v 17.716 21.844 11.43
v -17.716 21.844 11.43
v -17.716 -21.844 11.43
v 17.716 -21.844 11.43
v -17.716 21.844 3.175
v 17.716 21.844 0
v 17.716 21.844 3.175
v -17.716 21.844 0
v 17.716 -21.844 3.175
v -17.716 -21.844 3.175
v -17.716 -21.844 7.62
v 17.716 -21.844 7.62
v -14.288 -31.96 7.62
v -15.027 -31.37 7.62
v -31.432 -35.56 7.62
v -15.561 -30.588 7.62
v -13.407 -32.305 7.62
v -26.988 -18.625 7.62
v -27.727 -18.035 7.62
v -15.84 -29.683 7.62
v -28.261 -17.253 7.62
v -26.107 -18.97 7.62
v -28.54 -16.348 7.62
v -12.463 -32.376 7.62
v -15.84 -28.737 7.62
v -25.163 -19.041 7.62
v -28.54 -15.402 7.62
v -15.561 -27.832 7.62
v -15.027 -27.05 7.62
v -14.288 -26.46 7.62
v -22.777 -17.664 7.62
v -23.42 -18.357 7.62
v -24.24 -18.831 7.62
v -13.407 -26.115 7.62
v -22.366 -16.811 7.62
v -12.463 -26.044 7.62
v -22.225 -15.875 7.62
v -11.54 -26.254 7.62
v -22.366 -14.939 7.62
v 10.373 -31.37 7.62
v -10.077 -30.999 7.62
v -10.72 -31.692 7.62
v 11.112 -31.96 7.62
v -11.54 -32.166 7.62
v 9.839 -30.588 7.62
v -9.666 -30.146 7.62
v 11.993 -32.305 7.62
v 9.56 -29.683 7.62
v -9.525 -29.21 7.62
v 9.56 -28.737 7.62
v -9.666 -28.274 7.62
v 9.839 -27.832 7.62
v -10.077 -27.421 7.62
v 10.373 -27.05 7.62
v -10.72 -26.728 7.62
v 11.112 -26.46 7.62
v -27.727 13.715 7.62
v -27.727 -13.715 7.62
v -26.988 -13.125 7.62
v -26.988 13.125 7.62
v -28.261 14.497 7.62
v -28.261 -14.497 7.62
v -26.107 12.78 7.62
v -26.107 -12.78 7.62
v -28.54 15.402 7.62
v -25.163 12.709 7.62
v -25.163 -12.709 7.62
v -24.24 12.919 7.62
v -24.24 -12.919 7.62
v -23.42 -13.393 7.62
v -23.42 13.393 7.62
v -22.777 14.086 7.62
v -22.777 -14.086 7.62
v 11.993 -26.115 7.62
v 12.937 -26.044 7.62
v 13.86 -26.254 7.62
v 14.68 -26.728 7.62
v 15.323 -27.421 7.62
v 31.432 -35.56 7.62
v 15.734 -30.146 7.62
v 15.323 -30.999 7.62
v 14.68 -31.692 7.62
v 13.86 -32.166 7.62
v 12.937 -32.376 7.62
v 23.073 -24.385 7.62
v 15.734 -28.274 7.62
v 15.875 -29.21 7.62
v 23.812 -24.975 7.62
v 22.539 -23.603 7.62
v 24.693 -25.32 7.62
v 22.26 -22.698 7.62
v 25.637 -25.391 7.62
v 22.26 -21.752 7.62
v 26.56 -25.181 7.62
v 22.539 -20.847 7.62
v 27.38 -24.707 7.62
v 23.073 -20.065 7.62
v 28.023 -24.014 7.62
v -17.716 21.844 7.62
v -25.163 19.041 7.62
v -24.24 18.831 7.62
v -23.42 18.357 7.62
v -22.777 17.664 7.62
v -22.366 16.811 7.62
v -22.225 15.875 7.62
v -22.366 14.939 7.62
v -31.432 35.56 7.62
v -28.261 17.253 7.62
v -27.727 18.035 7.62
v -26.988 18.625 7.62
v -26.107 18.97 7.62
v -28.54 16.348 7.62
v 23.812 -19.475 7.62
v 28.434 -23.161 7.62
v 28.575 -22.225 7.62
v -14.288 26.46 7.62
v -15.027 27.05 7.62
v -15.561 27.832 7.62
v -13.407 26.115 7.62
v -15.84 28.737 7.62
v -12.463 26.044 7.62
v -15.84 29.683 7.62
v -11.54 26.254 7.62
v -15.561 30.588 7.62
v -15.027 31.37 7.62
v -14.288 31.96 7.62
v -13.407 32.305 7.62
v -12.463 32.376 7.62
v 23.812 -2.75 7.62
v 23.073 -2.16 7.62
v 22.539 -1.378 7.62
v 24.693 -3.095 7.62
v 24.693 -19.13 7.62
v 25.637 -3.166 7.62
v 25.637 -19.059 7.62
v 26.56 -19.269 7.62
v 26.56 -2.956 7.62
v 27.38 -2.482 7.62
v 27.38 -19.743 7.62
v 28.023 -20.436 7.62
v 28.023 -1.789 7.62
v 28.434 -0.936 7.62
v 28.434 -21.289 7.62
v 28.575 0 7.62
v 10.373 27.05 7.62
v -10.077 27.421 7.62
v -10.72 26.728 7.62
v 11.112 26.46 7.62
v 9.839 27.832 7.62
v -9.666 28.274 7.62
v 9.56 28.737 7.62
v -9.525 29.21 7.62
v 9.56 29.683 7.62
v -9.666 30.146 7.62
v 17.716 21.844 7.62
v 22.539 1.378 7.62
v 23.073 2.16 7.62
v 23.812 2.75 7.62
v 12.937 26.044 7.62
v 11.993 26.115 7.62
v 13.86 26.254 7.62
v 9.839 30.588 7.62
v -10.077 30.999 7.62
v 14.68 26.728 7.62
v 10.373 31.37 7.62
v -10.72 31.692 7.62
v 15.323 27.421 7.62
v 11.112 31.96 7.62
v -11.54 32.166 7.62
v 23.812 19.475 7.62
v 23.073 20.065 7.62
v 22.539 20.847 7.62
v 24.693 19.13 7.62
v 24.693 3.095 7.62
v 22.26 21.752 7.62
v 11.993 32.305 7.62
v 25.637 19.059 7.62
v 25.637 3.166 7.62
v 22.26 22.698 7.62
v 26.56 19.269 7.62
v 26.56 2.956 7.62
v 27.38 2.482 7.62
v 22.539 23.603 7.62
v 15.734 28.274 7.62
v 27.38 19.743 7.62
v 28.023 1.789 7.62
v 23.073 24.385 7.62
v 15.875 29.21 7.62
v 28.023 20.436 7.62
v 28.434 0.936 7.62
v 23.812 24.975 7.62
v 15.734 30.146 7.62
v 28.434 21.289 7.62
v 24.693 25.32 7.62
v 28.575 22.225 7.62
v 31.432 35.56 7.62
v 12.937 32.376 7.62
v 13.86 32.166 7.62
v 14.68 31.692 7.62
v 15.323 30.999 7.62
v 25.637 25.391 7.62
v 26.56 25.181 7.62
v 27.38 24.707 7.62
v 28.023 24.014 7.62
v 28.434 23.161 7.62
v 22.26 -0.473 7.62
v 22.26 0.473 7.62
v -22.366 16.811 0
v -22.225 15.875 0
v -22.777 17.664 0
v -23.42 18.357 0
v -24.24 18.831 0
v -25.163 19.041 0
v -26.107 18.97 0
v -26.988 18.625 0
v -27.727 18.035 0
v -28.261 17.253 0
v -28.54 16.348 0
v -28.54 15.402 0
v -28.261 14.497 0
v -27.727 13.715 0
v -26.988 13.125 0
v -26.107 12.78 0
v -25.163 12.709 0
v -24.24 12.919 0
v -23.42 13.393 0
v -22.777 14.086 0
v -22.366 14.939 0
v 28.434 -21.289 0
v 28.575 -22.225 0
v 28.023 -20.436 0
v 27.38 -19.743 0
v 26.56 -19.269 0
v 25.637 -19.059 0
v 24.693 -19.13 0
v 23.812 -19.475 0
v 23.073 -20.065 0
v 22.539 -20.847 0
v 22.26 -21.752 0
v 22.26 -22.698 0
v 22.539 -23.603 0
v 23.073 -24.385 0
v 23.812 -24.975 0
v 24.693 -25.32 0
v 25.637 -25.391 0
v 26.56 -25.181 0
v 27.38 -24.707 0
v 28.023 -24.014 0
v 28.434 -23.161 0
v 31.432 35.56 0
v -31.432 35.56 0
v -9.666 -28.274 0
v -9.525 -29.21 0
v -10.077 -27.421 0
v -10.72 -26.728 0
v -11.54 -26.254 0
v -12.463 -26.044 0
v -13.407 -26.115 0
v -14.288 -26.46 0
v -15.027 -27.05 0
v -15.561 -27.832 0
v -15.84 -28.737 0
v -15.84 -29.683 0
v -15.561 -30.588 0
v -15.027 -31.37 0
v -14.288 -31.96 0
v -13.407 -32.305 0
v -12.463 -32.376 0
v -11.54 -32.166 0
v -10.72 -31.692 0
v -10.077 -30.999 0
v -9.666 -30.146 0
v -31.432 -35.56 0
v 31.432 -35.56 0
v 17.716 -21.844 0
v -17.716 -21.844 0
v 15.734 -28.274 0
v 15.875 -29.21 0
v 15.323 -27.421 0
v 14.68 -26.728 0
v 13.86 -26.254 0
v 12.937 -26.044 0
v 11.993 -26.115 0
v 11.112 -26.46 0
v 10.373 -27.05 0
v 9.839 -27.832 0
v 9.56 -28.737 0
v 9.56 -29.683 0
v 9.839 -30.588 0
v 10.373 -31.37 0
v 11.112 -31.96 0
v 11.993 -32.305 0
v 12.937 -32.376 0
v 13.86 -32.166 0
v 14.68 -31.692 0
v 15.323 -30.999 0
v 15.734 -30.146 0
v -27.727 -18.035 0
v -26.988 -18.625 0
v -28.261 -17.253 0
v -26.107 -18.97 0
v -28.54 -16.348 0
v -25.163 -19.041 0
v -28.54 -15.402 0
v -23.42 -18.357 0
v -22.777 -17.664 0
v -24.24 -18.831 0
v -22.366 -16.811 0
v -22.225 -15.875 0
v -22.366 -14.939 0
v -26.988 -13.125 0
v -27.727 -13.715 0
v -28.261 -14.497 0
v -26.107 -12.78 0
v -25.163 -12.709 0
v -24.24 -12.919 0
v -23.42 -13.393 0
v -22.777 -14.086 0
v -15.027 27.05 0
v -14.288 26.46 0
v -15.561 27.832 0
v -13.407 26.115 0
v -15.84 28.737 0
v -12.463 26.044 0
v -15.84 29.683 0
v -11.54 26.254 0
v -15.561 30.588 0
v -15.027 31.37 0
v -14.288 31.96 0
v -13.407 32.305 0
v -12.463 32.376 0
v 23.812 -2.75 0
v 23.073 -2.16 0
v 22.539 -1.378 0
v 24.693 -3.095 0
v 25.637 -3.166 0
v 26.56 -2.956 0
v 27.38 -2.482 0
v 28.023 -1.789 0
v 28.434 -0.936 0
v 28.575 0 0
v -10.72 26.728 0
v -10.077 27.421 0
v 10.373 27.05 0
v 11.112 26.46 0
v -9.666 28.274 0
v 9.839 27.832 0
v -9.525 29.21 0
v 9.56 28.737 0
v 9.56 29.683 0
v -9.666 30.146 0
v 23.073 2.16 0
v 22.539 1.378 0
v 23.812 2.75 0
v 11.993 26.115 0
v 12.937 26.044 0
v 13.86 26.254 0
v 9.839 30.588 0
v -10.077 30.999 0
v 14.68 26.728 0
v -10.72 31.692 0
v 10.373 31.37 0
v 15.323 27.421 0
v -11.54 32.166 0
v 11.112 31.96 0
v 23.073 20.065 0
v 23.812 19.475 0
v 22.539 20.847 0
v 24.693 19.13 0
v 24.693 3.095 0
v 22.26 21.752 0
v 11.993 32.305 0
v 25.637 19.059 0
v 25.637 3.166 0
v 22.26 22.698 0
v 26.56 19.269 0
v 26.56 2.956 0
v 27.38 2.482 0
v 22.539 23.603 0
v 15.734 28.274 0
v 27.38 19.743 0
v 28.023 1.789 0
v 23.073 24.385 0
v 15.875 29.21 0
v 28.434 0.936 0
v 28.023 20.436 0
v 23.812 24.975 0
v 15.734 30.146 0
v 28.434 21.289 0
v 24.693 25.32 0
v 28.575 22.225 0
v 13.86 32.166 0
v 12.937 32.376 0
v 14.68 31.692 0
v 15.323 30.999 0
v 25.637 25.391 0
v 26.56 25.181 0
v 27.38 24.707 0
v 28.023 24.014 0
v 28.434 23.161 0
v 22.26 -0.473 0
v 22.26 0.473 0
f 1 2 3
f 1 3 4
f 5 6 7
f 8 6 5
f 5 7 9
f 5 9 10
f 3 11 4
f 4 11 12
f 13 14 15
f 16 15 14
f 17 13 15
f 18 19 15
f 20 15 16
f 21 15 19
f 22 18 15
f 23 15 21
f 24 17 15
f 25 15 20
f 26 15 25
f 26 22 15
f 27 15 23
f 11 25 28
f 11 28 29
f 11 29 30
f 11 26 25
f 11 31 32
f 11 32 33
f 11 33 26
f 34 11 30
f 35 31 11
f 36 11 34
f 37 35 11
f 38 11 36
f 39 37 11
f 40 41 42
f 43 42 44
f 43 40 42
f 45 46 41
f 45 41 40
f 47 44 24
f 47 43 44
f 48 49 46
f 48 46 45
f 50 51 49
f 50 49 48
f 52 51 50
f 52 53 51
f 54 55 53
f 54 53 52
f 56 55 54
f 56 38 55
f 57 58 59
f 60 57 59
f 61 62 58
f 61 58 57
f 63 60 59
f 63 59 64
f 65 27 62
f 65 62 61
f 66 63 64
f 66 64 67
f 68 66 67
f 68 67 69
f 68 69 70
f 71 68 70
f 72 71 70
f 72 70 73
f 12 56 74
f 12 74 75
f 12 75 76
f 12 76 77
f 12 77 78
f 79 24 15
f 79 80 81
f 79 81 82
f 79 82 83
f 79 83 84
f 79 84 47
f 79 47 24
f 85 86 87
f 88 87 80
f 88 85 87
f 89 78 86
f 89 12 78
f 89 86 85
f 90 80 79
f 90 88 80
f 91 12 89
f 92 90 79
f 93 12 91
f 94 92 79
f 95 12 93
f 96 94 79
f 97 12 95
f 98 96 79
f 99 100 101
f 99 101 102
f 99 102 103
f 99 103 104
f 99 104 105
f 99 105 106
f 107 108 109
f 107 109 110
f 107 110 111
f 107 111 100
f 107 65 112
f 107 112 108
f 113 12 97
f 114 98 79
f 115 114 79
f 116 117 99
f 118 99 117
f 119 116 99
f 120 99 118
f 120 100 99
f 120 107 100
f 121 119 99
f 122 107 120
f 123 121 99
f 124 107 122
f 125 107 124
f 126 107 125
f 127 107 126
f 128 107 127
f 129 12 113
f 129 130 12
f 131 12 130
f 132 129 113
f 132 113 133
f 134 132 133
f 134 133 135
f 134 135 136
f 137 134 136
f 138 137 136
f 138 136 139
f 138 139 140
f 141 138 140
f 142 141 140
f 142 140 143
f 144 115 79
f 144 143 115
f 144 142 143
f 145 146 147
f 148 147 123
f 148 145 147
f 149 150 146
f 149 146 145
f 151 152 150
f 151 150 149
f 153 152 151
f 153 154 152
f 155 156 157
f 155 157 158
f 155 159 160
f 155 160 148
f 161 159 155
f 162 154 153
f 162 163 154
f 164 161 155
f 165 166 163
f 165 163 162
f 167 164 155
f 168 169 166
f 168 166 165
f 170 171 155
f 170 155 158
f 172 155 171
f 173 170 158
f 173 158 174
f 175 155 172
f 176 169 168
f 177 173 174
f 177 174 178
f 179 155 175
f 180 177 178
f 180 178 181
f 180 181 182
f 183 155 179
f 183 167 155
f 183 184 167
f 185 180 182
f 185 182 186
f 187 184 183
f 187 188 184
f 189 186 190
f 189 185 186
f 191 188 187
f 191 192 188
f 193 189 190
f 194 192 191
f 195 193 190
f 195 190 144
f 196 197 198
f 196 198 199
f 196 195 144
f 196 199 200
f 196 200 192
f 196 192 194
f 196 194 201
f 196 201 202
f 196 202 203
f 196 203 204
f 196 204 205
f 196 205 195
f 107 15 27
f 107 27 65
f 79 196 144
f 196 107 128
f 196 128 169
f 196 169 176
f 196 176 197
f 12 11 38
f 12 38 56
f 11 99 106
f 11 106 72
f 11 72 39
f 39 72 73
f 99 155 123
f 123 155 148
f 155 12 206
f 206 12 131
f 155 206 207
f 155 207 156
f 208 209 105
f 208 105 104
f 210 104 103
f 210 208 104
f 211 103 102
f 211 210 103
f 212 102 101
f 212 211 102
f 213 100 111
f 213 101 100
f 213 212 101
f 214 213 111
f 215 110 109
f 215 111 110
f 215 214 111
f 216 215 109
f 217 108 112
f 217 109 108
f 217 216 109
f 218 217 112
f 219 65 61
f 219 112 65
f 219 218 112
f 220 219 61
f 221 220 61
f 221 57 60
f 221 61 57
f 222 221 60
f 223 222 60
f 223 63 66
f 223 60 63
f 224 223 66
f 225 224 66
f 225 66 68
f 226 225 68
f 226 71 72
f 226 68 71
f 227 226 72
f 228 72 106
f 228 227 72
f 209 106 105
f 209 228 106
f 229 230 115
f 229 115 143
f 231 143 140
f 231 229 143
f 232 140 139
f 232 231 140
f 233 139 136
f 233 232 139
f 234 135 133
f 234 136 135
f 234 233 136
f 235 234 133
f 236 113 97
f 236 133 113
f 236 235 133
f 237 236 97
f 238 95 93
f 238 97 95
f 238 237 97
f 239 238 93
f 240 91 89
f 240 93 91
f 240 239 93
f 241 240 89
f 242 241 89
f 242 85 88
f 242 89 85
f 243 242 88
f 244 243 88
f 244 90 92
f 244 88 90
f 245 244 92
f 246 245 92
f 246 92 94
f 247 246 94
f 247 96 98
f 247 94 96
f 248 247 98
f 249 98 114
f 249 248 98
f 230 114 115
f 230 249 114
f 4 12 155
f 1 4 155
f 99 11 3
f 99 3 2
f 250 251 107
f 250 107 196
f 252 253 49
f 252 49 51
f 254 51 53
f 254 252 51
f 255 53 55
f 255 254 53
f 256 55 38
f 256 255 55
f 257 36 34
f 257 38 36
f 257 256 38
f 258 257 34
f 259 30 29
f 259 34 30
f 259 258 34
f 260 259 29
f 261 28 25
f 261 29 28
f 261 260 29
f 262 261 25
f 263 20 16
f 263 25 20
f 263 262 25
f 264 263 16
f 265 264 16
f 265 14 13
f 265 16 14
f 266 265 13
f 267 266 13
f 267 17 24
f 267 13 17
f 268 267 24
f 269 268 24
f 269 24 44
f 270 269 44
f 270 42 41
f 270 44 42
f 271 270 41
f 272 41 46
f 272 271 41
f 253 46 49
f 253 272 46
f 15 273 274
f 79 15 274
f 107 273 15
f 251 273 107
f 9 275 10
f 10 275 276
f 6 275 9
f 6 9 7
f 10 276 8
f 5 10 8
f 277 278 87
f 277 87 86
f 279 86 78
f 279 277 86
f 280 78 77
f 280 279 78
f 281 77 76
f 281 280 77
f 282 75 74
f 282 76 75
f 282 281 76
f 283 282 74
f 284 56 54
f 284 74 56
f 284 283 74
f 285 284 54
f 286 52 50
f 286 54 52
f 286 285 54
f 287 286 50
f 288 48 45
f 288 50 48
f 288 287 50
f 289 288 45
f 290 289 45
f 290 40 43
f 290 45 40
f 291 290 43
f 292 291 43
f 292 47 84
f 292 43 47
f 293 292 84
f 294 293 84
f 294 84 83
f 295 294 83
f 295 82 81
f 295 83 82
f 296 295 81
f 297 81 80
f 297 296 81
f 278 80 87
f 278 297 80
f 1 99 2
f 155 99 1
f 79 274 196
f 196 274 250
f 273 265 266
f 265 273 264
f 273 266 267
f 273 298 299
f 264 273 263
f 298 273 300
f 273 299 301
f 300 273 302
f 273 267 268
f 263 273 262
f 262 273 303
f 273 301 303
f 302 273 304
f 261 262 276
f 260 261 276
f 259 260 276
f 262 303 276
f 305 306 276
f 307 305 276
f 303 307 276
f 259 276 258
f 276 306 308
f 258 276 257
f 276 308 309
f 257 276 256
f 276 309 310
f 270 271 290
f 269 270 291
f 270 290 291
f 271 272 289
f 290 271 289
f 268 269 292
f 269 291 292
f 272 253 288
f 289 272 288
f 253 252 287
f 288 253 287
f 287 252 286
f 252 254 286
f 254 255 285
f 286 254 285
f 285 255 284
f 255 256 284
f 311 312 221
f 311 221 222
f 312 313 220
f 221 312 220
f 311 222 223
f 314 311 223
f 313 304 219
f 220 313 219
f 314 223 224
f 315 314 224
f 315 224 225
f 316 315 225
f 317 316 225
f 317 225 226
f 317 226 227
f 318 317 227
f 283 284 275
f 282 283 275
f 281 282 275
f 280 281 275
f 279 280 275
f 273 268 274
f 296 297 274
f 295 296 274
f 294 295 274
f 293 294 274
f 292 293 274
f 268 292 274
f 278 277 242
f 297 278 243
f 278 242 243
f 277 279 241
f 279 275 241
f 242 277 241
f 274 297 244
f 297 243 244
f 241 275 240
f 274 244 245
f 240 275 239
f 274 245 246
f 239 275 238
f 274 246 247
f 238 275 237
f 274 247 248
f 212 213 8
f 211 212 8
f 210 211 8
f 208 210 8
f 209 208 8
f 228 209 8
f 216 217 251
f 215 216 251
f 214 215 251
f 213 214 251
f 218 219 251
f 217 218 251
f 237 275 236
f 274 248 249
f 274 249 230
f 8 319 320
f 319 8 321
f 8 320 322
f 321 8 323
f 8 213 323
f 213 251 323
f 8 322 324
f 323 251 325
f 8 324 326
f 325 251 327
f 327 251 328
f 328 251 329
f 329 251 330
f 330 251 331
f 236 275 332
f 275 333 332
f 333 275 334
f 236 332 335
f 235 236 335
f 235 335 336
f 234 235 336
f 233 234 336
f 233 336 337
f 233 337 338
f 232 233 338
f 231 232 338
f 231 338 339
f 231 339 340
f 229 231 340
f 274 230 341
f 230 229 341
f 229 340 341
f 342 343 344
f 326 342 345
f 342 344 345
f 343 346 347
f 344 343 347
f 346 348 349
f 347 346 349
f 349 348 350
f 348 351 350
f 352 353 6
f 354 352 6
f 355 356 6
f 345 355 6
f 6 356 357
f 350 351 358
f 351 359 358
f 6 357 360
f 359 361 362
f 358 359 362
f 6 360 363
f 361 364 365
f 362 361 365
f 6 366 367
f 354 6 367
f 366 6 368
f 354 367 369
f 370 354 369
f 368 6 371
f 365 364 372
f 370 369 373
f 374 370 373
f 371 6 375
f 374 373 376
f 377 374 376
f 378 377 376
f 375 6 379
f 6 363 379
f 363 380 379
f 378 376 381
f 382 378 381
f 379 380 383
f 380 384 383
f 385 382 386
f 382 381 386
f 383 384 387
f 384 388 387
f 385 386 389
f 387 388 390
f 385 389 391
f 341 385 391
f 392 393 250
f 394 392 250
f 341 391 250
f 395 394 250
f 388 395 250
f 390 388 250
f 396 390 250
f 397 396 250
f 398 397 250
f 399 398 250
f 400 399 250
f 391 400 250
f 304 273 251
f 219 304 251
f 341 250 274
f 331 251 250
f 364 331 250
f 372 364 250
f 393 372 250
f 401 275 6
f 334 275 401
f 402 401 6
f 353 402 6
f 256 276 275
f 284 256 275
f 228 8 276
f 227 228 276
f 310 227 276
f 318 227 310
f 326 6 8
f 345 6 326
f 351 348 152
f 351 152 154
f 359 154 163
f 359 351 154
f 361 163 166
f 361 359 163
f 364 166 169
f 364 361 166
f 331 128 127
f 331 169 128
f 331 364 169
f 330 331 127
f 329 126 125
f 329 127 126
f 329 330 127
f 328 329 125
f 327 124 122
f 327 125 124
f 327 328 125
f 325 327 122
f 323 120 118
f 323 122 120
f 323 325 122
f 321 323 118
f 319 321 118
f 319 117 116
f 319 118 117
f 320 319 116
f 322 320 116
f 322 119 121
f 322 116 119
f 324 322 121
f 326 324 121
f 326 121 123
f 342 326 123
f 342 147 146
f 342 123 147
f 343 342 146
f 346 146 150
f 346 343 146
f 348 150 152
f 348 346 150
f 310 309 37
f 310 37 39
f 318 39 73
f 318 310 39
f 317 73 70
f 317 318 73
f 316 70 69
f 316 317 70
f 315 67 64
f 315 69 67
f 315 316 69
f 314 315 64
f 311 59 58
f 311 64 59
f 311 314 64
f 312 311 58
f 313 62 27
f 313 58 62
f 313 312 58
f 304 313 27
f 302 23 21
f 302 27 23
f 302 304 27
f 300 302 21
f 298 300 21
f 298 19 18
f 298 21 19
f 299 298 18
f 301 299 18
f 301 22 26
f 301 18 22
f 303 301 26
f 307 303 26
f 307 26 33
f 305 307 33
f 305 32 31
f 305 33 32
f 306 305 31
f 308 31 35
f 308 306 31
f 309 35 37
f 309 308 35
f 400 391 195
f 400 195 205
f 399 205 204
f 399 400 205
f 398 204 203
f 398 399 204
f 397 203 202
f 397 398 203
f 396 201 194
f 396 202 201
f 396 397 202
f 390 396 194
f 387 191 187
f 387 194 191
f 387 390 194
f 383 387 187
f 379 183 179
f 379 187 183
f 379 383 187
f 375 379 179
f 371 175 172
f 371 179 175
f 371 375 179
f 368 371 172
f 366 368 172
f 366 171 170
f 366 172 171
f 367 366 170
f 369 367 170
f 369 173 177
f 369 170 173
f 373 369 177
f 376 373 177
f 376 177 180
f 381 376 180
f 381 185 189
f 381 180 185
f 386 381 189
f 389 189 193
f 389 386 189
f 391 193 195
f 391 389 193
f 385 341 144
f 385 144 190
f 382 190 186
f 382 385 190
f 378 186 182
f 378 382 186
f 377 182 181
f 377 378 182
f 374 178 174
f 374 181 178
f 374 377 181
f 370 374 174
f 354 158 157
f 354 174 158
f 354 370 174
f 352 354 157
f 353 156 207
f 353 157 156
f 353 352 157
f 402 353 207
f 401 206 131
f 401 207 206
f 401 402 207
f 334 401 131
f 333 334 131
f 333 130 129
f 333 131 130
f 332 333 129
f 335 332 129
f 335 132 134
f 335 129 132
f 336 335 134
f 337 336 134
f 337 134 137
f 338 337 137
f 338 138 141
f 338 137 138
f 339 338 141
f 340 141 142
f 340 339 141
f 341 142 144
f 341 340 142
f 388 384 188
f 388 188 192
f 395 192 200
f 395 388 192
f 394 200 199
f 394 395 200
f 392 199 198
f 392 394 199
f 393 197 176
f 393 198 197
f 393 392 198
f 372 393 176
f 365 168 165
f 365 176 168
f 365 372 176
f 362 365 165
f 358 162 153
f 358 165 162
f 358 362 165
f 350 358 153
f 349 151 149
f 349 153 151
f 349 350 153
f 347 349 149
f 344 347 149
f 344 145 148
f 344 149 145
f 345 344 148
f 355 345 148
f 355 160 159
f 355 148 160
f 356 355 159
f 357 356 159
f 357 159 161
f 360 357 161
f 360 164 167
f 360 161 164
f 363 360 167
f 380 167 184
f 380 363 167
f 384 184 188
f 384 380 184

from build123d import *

# Parameters (mm, degrees)
SKETCH1_W               = 62.865
SKETCH1_H               = 71.12
BOSS_EXTRUDE1_DEPTH     = 7.62
SKETCH2_W               = 35.433
SKETCH2_H               = 43.688
BOSS_EXTRUDE2_DEPTH     = 3.81
SKETCH3_W               = 35.433
SKETCH3_H               = 43.688
CUT_EXTRUDE1_DEPTH      = 3.175
CUT_EXTRUDE2_DEPTH      = 49.068493384
CUT_EXTRUDE2_DEPTH_BACK = 49.068493384
SKETCH4_R               = 3.175


with BuildPart() as part:
    # Sketch1 → Boss-Extrude1 (new body)
    with BuildSketch(Plane.XY):
        Rectangle(SKETCH1_W, SKETCH1_H)
    extrude(amount=BOSS_EXTRUDE1_DEPTH)

    # Sketch2 → Boss-Extrude2 (add)
    with BuildSketch(Plane.XY.offset(7.62)):
        Rectangle(SKETCH2_W, SKETCH2_H)
    extrude(amount=BOSS_EXTRUDE2_DEPTH)

    # Sketch3 → Cut-Extrude1 (cut)
    with BuildSketch(Plane(origin=(0, 0, 0), x_dir=(-1, 0, 0), z_dir=(0, 0, -1))):
        Rectangle(SKETCH3_W, SKETCH3_H)
    extrude(amount=-CUT_EXTRUDE1_DEPTH, mode=Mode.SUBTRACT)

    # Sketch4 → Cut-Extrude2 (cut, two sides: drawn at the far end of the back side and taken through both)
    with BuildSketch(Plane.XY.offset(7.62).offset(-CUT_EXTRUDE2_DEPTH_BACK)):
        with Locations((-12.7, 29.21)):
            Circle(SKETCH4_R)
        with Locations((-25.4, 15.875)):
            Circle(SKETCH4_R)
        with Locations((-12.7, -29.21)):
            Circle(SKETCH4_R)
        with Locations((-25.4, -15.875)):
            Circle(SKETCH4_R)
        with Locations((12.7, -29.21)):
            Circle(SKETCH4_R)
        with Locations((12.7, 29.21)):
            Circle(SKETCH4_R)
        with Locations((25.4, 0)):
            Circle(SKETCH4_R)
        with Locations((25.4, 22.225)):
            Circle(SKETCH4_R)
        with Locations((25.4, -22.225)):
            Circle(SKETCH4_R)
    extrude(amount=CUT_EXTRUDE2_DEPTH + CUT_EXTRUDE2_DEPTH_BACK, mode=Mode.SUBTRACT)


solid = part.part
